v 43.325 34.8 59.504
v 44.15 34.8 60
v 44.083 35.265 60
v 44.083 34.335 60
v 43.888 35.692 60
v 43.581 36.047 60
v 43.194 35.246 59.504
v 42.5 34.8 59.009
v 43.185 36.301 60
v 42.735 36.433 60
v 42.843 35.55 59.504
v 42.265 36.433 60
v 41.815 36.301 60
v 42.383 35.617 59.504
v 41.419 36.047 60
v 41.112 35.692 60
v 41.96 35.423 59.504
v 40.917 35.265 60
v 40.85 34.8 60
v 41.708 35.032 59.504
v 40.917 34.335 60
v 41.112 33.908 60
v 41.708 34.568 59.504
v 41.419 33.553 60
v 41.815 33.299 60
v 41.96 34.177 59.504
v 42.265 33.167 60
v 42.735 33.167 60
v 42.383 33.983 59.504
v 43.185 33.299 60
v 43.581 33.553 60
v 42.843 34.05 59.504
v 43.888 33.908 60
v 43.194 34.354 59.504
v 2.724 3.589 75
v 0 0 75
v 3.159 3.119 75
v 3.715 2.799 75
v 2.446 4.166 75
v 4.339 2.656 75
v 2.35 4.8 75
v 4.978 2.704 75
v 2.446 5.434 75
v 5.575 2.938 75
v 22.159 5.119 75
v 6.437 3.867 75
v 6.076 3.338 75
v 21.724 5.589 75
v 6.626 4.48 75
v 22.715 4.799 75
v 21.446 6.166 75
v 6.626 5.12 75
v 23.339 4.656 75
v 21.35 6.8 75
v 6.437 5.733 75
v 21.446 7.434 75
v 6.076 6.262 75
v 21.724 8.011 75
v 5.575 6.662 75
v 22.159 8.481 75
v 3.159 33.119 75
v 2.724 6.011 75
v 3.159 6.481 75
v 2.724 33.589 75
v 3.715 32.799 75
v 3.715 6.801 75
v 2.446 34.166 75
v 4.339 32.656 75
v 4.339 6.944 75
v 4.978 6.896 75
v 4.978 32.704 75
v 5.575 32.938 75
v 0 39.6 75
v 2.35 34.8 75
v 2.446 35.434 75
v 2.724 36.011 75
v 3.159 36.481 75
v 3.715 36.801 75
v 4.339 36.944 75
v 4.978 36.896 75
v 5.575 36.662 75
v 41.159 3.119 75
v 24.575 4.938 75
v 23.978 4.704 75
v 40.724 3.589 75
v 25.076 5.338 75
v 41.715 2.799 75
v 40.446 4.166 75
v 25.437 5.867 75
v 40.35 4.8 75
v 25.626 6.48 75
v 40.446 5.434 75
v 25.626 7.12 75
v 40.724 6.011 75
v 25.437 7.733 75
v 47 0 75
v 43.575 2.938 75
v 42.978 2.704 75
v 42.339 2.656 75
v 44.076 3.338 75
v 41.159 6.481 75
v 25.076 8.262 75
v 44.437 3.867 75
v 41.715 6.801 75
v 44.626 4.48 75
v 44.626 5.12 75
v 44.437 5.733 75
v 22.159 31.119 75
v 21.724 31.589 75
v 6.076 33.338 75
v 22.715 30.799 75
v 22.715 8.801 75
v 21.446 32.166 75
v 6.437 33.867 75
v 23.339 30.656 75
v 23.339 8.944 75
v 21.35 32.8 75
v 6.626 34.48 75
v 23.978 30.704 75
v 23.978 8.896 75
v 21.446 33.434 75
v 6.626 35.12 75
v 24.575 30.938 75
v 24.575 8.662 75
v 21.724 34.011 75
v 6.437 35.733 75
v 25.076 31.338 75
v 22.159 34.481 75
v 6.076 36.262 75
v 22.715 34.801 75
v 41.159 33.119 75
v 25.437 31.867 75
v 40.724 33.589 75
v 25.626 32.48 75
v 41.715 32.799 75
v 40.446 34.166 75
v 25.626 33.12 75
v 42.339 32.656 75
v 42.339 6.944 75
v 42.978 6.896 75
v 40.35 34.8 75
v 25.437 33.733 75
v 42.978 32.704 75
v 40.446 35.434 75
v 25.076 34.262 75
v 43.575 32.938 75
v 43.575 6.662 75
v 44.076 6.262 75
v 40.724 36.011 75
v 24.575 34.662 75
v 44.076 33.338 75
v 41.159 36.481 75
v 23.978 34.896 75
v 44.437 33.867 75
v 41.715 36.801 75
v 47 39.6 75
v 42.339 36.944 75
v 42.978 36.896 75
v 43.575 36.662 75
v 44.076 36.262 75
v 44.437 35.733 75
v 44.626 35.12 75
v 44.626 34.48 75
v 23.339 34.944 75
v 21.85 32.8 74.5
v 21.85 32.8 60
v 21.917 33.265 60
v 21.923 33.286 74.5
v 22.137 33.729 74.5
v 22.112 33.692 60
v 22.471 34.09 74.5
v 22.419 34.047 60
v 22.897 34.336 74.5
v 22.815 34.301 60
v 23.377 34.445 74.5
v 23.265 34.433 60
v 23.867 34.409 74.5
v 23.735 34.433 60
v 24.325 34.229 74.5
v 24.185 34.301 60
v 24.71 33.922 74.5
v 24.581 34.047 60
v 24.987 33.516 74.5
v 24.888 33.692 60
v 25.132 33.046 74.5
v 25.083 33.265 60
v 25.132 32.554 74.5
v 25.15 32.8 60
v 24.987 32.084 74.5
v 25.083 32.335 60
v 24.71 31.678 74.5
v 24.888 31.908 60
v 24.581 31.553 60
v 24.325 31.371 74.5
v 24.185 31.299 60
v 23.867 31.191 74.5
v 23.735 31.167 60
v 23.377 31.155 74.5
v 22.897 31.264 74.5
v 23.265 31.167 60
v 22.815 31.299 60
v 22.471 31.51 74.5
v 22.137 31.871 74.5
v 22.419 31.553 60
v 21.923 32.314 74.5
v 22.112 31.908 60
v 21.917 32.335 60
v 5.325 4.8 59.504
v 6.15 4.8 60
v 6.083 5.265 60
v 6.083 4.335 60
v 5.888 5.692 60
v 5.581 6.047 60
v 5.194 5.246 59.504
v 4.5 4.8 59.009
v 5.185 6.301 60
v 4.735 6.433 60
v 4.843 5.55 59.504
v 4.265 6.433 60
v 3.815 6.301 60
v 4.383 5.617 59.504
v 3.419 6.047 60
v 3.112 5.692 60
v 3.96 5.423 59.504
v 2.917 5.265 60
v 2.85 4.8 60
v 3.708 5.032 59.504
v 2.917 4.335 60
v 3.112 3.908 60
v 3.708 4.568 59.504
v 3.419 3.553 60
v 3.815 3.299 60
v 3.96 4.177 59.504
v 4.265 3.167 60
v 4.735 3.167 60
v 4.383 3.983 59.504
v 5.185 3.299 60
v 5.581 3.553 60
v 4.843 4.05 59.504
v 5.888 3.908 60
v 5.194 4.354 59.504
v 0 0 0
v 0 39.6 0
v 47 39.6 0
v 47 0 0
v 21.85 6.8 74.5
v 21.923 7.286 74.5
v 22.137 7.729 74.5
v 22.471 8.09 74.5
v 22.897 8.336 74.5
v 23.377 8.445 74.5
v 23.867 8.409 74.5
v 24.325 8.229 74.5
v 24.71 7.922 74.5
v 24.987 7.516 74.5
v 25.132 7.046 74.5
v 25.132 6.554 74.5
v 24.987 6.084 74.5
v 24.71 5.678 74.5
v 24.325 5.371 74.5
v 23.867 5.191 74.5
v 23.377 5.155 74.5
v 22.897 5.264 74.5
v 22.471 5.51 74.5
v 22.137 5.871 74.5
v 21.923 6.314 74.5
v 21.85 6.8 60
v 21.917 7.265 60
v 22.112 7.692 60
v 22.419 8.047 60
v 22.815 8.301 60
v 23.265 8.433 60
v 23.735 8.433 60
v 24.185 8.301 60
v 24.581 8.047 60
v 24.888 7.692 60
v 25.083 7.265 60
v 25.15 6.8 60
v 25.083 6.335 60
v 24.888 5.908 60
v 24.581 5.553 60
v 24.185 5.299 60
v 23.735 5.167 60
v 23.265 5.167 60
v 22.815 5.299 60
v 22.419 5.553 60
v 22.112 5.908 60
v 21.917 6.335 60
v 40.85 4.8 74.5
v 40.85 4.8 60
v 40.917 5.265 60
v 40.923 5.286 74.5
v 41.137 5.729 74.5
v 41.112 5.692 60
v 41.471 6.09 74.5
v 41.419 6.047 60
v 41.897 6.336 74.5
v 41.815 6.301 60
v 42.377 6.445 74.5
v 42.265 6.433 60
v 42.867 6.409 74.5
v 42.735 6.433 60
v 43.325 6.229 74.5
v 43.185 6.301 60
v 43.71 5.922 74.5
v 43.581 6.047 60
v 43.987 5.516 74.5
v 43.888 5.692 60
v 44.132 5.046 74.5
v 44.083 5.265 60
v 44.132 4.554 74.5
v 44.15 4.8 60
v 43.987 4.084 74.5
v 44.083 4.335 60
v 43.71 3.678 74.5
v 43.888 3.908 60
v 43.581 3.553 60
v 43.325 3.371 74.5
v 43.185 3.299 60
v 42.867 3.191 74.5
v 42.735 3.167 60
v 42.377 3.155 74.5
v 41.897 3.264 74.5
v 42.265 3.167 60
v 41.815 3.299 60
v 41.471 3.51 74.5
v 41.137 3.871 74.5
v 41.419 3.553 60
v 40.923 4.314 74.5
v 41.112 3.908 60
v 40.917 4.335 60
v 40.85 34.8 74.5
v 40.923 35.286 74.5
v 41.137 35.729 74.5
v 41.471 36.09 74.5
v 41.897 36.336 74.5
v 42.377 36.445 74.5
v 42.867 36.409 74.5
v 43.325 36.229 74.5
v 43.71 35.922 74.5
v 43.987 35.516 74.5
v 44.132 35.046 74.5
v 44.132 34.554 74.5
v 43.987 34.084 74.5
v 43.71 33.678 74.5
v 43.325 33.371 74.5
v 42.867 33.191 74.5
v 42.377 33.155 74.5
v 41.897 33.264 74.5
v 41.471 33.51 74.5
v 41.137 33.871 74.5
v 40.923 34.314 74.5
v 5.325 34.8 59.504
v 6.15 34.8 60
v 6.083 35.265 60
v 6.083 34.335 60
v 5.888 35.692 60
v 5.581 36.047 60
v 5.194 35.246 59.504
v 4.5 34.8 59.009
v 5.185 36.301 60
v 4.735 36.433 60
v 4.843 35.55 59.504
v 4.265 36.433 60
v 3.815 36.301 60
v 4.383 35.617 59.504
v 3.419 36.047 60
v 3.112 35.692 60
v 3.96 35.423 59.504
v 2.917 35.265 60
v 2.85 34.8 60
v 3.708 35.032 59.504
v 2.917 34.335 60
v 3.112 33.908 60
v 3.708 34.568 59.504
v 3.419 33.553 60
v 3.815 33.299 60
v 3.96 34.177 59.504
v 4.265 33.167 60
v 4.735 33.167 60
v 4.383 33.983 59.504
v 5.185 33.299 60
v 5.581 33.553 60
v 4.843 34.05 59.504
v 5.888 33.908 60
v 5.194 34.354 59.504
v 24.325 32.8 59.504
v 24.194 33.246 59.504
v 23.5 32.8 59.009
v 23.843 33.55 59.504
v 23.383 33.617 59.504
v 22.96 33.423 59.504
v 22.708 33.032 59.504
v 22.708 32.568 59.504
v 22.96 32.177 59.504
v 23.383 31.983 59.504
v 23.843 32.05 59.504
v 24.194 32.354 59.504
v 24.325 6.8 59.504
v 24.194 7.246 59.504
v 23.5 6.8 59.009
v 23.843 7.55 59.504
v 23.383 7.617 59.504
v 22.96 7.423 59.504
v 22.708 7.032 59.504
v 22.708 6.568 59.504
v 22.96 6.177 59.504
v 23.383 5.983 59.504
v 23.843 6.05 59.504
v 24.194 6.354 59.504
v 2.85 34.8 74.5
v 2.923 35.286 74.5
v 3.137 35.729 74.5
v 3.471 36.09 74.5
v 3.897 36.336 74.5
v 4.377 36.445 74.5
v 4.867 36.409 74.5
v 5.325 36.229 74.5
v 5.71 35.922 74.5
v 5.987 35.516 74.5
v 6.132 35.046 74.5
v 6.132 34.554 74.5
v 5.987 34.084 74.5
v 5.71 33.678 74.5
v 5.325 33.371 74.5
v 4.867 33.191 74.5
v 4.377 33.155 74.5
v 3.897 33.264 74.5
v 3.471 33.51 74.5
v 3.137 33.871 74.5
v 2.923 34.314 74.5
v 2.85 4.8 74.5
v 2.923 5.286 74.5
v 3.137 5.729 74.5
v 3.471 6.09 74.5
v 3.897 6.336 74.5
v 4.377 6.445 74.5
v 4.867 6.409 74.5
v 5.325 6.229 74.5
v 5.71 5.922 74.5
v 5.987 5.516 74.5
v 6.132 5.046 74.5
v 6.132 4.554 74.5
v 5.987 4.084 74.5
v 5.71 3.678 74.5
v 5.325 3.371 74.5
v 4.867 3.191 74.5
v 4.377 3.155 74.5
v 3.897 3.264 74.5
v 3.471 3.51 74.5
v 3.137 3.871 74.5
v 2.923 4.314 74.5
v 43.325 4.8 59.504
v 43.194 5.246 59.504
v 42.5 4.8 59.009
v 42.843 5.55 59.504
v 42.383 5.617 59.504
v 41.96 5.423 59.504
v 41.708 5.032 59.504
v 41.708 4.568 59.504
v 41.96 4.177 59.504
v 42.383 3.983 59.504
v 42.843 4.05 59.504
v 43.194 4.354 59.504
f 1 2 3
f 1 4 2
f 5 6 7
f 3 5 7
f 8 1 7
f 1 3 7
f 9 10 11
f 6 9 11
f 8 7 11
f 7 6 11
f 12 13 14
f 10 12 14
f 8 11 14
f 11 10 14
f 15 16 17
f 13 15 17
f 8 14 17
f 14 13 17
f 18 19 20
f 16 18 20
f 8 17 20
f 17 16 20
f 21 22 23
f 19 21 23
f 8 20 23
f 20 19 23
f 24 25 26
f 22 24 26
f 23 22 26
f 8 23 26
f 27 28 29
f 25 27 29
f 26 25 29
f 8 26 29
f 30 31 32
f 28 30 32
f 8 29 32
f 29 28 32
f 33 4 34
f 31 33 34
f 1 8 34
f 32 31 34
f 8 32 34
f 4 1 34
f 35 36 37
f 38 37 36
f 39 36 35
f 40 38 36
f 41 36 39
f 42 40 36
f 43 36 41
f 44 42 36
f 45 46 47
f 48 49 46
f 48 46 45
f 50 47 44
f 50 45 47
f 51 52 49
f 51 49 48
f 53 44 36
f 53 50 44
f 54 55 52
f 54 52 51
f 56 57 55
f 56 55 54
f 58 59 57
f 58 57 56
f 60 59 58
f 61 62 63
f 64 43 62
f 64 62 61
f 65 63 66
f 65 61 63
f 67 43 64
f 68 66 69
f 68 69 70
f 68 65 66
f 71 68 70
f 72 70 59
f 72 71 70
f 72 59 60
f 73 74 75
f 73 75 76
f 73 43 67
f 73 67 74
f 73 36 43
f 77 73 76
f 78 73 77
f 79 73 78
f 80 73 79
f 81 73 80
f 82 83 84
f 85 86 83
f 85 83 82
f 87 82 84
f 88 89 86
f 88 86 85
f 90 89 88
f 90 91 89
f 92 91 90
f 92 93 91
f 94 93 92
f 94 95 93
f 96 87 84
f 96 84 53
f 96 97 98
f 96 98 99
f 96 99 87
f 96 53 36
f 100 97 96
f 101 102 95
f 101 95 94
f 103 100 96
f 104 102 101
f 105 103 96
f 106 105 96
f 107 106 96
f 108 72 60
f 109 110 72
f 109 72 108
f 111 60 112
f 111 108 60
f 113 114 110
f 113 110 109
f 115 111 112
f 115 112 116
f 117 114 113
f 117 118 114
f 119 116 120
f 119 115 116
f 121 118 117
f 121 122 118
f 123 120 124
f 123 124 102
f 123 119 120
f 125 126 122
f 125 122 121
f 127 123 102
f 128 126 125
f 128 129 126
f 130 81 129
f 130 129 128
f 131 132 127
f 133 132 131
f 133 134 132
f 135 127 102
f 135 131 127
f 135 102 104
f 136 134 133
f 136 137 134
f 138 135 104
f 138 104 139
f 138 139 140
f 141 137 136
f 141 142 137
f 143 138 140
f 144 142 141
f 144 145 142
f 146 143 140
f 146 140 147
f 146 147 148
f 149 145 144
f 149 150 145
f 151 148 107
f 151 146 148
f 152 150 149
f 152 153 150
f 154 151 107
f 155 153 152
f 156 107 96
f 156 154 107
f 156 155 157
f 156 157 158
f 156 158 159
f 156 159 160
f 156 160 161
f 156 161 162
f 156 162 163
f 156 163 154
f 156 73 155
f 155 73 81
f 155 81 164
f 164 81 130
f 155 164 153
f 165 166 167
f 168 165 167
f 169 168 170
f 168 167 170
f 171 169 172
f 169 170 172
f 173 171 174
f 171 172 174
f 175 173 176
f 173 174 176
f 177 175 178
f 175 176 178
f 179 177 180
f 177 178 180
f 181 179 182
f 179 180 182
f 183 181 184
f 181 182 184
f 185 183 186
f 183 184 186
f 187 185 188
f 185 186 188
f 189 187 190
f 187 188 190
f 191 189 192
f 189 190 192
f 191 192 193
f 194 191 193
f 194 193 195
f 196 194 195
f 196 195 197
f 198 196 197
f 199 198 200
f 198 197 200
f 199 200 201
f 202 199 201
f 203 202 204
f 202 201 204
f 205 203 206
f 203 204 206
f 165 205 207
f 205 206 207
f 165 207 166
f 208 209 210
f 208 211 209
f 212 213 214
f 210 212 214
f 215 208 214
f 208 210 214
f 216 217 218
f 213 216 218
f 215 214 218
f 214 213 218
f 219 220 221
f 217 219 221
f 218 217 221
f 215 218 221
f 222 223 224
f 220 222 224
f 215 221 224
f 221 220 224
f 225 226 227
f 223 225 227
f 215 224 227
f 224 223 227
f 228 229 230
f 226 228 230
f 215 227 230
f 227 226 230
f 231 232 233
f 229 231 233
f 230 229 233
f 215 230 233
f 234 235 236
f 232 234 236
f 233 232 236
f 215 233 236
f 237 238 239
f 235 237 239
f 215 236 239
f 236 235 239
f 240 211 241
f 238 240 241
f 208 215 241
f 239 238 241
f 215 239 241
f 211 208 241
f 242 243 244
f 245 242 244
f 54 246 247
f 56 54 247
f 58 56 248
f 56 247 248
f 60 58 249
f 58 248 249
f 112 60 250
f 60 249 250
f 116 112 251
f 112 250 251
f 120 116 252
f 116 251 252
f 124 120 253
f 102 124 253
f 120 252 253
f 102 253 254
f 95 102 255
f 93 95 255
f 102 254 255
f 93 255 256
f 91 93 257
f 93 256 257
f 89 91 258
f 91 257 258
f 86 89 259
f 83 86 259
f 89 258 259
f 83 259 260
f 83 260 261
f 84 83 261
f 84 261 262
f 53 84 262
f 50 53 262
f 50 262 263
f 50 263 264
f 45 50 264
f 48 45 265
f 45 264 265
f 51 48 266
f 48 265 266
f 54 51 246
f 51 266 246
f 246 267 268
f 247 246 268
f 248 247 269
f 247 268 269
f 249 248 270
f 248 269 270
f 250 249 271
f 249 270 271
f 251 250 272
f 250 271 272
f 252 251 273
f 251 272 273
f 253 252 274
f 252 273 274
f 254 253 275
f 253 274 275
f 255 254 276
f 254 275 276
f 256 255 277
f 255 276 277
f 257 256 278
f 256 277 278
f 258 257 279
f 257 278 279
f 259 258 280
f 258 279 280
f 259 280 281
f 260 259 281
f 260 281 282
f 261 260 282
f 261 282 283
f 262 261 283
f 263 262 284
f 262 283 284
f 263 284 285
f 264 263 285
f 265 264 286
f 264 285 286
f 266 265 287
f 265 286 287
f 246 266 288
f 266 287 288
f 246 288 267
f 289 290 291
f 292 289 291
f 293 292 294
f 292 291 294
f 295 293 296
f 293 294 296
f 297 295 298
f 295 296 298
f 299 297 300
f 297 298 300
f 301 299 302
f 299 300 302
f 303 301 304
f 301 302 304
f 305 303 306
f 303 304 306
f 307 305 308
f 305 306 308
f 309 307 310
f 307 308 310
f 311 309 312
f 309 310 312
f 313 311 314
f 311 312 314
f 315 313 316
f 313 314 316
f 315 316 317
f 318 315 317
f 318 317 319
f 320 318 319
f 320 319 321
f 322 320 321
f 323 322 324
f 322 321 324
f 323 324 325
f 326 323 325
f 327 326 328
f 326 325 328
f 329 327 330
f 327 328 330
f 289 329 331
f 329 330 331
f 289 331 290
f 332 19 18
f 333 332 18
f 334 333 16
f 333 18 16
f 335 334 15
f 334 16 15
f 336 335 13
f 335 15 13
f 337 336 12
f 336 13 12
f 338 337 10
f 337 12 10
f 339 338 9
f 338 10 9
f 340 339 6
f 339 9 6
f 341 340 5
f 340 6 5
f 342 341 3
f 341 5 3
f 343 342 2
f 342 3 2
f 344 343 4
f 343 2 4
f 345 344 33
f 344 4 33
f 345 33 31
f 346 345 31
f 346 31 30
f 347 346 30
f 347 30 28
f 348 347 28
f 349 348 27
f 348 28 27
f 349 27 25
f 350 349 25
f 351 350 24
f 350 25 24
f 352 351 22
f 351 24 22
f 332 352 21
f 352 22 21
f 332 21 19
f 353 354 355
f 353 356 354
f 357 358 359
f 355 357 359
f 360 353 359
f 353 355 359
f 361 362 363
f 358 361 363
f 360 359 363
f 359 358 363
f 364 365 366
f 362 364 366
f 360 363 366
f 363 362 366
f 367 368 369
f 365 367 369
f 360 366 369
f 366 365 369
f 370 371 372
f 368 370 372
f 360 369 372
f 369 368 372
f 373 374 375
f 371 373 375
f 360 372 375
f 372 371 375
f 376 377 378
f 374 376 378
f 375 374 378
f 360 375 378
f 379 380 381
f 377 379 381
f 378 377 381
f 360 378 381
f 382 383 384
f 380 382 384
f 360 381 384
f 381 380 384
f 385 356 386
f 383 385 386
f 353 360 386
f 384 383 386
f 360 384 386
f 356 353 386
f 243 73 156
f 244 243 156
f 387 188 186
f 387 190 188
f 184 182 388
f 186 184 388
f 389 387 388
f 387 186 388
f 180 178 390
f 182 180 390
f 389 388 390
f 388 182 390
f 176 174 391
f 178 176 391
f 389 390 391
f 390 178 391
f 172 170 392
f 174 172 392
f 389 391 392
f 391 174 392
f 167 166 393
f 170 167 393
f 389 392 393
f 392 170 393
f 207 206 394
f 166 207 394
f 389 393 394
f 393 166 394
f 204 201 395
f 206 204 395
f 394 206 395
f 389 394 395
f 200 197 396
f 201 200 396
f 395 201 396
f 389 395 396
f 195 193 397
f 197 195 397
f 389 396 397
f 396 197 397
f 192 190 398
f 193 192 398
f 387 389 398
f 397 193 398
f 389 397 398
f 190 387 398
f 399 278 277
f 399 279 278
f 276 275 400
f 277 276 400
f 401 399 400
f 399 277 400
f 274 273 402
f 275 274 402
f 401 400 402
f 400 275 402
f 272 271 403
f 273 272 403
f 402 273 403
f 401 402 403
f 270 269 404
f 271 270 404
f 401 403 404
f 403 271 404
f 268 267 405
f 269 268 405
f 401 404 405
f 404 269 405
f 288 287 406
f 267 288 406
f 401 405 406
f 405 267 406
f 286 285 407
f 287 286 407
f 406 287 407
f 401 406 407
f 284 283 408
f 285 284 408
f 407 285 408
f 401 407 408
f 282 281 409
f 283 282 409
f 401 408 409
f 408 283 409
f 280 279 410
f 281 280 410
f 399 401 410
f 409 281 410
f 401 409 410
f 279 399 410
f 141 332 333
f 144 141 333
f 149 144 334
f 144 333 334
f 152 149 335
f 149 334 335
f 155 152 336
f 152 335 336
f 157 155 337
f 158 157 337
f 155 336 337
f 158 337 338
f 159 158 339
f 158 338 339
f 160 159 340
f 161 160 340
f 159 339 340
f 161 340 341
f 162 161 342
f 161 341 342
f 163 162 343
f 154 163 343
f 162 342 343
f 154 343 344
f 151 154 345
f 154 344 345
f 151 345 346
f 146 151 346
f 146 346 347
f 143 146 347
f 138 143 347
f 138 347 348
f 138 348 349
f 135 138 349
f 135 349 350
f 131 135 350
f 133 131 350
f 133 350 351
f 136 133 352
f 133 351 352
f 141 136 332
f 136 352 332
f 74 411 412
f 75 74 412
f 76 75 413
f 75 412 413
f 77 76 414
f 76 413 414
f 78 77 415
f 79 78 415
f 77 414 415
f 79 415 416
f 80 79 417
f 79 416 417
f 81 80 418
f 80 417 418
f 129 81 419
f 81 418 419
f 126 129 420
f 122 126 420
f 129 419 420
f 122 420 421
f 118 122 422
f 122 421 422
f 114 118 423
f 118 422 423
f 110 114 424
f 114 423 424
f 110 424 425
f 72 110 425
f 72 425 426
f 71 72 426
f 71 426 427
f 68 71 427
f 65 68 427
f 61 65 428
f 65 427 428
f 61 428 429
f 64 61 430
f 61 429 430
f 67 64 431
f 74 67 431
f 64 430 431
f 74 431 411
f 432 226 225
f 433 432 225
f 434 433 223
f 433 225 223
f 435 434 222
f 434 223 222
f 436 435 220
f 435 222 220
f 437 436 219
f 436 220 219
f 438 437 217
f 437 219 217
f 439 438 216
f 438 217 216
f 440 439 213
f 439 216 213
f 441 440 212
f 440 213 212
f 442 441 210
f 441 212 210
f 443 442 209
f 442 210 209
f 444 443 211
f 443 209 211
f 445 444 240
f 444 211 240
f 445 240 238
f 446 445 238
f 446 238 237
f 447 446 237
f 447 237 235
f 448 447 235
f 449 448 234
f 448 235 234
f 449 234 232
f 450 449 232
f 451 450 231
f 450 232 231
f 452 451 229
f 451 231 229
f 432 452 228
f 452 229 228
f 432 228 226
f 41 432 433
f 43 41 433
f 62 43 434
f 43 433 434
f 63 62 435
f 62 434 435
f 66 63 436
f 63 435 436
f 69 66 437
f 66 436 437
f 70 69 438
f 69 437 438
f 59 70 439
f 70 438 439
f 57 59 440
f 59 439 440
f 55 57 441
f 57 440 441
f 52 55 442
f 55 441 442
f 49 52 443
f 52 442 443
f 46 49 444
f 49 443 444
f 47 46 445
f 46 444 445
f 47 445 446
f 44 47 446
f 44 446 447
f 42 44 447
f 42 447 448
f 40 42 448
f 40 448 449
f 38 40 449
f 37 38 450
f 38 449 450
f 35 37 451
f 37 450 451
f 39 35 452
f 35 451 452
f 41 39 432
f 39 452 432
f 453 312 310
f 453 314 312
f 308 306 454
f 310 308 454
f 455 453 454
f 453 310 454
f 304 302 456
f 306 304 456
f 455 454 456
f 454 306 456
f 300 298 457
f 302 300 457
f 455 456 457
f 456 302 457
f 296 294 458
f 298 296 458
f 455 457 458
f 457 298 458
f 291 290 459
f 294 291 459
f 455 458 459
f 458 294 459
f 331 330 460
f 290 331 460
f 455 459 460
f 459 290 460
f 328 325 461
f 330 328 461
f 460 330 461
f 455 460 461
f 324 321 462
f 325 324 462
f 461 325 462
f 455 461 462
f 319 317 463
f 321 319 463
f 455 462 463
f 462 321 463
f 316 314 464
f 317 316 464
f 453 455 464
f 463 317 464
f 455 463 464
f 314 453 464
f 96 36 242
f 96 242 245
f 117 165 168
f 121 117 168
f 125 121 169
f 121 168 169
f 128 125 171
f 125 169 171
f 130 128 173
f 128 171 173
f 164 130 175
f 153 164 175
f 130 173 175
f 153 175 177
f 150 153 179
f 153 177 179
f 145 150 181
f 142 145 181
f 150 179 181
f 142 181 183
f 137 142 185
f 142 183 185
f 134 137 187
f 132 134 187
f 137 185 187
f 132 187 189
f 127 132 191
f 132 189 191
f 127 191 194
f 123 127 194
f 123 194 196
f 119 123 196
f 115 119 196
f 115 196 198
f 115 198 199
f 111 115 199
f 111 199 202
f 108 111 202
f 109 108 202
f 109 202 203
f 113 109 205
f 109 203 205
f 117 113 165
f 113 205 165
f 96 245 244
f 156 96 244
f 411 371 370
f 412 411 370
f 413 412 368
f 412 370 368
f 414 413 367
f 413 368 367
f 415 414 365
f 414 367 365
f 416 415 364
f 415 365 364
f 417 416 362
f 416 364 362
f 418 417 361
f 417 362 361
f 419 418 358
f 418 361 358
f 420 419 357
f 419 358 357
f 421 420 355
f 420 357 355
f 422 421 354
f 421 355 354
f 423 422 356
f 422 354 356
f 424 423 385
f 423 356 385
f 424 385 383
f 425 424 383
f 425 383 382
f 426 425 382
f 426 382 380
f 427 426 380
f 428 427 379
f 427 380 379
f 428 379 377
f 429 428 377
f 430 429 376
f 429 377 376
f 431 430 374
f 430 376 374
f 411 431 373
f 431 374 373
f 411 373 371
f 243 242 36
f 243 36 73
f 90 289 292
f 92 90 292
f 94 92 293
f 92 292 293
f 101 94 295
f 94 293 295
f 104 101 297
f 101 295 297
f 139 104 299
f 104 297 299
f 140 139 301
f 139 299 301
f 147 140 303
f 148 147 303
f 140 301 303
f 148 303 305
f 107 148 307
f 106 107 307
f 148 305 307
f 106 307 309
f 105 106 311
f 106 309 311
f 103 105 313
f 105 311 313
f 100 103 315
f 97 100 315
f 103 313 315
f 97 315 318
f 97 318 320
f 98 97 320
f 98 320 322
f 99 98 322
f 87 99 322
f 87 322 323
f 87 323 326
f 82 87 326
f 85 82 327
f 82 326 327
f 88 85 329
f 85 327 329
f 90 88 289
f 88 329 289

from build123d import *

# Parameters (mm, degrees)
SZKIC1_W                       = 47
SZKIC1_H                       = 39.6
DODANIE_WYCI_GNI_CIE1_DEPTH    = 75
OTW_R_GWINTOWANY_M4X0_72_D     = 3.3
OTW_R_GWINTOWANY_M4X0_72_DEPTH = 15
OTW_R_GWINTOWANY_M4X0_72_TIP   = 0.991420021
SFAZOWANIE1_SIZE               = 0.5


with BuildPart() as part:
    # Szkic1 → Dodanie-wyciągnięcie1 (new body)
    with BuildSketch(Plane.XY):
        with Locations((23.5, 19.8)):
            Rectangle(SZKIC1_W, SZKIC1_H)
    extrude(amount=DODANIE_WYCI_GNI_CIE1_DEPTH)

    # Otwór gwintowany M4x0.72
    with Locations(Plane.XY.offset(75)):
        with Locations((4.5, 34.8), (23.5, 32.8), (42.5, 34.8), (42.5, 4.8), (23.5, 6.8), (4.5, 4.8)):
            Hole(OTW_R_GWINTOWANY_M4X0_72_D / 2, depth=OTW_R_GWINTOWANY_M4X0_72_DEPTH)
            with Locations((0, 0, -(OTW_R_GWINTOWANY_M4X0_72_DEPTH + OTW_R_GWINTOWANY_M4X0_72_TIP / 2))):  # 118° drill point
                Cone(0, OTW_R_GWINTOWANY_M4X0_72_D / 2, OTW_R_GWINTOWANY_M4X0_72_TIP, mode=Mode.SUBTRACT)

    # Sfazowanie1
    sfazowanie1_edges = [part.edges().sort_by_distance(p)[0] for p in [
        (6.15, 4.8, 75),
        (25.15, 6.8, 75),
        (44.15, 4.8, 75),
        (44.15, 34.8, 75),
        (25.15, 32.8, 75),
        (6.15, 34.8, 75),
    ]]
    chamfer(sfazowanie1_edges, length=SFAZOWANIE1_SIZE)


solid = part.part
